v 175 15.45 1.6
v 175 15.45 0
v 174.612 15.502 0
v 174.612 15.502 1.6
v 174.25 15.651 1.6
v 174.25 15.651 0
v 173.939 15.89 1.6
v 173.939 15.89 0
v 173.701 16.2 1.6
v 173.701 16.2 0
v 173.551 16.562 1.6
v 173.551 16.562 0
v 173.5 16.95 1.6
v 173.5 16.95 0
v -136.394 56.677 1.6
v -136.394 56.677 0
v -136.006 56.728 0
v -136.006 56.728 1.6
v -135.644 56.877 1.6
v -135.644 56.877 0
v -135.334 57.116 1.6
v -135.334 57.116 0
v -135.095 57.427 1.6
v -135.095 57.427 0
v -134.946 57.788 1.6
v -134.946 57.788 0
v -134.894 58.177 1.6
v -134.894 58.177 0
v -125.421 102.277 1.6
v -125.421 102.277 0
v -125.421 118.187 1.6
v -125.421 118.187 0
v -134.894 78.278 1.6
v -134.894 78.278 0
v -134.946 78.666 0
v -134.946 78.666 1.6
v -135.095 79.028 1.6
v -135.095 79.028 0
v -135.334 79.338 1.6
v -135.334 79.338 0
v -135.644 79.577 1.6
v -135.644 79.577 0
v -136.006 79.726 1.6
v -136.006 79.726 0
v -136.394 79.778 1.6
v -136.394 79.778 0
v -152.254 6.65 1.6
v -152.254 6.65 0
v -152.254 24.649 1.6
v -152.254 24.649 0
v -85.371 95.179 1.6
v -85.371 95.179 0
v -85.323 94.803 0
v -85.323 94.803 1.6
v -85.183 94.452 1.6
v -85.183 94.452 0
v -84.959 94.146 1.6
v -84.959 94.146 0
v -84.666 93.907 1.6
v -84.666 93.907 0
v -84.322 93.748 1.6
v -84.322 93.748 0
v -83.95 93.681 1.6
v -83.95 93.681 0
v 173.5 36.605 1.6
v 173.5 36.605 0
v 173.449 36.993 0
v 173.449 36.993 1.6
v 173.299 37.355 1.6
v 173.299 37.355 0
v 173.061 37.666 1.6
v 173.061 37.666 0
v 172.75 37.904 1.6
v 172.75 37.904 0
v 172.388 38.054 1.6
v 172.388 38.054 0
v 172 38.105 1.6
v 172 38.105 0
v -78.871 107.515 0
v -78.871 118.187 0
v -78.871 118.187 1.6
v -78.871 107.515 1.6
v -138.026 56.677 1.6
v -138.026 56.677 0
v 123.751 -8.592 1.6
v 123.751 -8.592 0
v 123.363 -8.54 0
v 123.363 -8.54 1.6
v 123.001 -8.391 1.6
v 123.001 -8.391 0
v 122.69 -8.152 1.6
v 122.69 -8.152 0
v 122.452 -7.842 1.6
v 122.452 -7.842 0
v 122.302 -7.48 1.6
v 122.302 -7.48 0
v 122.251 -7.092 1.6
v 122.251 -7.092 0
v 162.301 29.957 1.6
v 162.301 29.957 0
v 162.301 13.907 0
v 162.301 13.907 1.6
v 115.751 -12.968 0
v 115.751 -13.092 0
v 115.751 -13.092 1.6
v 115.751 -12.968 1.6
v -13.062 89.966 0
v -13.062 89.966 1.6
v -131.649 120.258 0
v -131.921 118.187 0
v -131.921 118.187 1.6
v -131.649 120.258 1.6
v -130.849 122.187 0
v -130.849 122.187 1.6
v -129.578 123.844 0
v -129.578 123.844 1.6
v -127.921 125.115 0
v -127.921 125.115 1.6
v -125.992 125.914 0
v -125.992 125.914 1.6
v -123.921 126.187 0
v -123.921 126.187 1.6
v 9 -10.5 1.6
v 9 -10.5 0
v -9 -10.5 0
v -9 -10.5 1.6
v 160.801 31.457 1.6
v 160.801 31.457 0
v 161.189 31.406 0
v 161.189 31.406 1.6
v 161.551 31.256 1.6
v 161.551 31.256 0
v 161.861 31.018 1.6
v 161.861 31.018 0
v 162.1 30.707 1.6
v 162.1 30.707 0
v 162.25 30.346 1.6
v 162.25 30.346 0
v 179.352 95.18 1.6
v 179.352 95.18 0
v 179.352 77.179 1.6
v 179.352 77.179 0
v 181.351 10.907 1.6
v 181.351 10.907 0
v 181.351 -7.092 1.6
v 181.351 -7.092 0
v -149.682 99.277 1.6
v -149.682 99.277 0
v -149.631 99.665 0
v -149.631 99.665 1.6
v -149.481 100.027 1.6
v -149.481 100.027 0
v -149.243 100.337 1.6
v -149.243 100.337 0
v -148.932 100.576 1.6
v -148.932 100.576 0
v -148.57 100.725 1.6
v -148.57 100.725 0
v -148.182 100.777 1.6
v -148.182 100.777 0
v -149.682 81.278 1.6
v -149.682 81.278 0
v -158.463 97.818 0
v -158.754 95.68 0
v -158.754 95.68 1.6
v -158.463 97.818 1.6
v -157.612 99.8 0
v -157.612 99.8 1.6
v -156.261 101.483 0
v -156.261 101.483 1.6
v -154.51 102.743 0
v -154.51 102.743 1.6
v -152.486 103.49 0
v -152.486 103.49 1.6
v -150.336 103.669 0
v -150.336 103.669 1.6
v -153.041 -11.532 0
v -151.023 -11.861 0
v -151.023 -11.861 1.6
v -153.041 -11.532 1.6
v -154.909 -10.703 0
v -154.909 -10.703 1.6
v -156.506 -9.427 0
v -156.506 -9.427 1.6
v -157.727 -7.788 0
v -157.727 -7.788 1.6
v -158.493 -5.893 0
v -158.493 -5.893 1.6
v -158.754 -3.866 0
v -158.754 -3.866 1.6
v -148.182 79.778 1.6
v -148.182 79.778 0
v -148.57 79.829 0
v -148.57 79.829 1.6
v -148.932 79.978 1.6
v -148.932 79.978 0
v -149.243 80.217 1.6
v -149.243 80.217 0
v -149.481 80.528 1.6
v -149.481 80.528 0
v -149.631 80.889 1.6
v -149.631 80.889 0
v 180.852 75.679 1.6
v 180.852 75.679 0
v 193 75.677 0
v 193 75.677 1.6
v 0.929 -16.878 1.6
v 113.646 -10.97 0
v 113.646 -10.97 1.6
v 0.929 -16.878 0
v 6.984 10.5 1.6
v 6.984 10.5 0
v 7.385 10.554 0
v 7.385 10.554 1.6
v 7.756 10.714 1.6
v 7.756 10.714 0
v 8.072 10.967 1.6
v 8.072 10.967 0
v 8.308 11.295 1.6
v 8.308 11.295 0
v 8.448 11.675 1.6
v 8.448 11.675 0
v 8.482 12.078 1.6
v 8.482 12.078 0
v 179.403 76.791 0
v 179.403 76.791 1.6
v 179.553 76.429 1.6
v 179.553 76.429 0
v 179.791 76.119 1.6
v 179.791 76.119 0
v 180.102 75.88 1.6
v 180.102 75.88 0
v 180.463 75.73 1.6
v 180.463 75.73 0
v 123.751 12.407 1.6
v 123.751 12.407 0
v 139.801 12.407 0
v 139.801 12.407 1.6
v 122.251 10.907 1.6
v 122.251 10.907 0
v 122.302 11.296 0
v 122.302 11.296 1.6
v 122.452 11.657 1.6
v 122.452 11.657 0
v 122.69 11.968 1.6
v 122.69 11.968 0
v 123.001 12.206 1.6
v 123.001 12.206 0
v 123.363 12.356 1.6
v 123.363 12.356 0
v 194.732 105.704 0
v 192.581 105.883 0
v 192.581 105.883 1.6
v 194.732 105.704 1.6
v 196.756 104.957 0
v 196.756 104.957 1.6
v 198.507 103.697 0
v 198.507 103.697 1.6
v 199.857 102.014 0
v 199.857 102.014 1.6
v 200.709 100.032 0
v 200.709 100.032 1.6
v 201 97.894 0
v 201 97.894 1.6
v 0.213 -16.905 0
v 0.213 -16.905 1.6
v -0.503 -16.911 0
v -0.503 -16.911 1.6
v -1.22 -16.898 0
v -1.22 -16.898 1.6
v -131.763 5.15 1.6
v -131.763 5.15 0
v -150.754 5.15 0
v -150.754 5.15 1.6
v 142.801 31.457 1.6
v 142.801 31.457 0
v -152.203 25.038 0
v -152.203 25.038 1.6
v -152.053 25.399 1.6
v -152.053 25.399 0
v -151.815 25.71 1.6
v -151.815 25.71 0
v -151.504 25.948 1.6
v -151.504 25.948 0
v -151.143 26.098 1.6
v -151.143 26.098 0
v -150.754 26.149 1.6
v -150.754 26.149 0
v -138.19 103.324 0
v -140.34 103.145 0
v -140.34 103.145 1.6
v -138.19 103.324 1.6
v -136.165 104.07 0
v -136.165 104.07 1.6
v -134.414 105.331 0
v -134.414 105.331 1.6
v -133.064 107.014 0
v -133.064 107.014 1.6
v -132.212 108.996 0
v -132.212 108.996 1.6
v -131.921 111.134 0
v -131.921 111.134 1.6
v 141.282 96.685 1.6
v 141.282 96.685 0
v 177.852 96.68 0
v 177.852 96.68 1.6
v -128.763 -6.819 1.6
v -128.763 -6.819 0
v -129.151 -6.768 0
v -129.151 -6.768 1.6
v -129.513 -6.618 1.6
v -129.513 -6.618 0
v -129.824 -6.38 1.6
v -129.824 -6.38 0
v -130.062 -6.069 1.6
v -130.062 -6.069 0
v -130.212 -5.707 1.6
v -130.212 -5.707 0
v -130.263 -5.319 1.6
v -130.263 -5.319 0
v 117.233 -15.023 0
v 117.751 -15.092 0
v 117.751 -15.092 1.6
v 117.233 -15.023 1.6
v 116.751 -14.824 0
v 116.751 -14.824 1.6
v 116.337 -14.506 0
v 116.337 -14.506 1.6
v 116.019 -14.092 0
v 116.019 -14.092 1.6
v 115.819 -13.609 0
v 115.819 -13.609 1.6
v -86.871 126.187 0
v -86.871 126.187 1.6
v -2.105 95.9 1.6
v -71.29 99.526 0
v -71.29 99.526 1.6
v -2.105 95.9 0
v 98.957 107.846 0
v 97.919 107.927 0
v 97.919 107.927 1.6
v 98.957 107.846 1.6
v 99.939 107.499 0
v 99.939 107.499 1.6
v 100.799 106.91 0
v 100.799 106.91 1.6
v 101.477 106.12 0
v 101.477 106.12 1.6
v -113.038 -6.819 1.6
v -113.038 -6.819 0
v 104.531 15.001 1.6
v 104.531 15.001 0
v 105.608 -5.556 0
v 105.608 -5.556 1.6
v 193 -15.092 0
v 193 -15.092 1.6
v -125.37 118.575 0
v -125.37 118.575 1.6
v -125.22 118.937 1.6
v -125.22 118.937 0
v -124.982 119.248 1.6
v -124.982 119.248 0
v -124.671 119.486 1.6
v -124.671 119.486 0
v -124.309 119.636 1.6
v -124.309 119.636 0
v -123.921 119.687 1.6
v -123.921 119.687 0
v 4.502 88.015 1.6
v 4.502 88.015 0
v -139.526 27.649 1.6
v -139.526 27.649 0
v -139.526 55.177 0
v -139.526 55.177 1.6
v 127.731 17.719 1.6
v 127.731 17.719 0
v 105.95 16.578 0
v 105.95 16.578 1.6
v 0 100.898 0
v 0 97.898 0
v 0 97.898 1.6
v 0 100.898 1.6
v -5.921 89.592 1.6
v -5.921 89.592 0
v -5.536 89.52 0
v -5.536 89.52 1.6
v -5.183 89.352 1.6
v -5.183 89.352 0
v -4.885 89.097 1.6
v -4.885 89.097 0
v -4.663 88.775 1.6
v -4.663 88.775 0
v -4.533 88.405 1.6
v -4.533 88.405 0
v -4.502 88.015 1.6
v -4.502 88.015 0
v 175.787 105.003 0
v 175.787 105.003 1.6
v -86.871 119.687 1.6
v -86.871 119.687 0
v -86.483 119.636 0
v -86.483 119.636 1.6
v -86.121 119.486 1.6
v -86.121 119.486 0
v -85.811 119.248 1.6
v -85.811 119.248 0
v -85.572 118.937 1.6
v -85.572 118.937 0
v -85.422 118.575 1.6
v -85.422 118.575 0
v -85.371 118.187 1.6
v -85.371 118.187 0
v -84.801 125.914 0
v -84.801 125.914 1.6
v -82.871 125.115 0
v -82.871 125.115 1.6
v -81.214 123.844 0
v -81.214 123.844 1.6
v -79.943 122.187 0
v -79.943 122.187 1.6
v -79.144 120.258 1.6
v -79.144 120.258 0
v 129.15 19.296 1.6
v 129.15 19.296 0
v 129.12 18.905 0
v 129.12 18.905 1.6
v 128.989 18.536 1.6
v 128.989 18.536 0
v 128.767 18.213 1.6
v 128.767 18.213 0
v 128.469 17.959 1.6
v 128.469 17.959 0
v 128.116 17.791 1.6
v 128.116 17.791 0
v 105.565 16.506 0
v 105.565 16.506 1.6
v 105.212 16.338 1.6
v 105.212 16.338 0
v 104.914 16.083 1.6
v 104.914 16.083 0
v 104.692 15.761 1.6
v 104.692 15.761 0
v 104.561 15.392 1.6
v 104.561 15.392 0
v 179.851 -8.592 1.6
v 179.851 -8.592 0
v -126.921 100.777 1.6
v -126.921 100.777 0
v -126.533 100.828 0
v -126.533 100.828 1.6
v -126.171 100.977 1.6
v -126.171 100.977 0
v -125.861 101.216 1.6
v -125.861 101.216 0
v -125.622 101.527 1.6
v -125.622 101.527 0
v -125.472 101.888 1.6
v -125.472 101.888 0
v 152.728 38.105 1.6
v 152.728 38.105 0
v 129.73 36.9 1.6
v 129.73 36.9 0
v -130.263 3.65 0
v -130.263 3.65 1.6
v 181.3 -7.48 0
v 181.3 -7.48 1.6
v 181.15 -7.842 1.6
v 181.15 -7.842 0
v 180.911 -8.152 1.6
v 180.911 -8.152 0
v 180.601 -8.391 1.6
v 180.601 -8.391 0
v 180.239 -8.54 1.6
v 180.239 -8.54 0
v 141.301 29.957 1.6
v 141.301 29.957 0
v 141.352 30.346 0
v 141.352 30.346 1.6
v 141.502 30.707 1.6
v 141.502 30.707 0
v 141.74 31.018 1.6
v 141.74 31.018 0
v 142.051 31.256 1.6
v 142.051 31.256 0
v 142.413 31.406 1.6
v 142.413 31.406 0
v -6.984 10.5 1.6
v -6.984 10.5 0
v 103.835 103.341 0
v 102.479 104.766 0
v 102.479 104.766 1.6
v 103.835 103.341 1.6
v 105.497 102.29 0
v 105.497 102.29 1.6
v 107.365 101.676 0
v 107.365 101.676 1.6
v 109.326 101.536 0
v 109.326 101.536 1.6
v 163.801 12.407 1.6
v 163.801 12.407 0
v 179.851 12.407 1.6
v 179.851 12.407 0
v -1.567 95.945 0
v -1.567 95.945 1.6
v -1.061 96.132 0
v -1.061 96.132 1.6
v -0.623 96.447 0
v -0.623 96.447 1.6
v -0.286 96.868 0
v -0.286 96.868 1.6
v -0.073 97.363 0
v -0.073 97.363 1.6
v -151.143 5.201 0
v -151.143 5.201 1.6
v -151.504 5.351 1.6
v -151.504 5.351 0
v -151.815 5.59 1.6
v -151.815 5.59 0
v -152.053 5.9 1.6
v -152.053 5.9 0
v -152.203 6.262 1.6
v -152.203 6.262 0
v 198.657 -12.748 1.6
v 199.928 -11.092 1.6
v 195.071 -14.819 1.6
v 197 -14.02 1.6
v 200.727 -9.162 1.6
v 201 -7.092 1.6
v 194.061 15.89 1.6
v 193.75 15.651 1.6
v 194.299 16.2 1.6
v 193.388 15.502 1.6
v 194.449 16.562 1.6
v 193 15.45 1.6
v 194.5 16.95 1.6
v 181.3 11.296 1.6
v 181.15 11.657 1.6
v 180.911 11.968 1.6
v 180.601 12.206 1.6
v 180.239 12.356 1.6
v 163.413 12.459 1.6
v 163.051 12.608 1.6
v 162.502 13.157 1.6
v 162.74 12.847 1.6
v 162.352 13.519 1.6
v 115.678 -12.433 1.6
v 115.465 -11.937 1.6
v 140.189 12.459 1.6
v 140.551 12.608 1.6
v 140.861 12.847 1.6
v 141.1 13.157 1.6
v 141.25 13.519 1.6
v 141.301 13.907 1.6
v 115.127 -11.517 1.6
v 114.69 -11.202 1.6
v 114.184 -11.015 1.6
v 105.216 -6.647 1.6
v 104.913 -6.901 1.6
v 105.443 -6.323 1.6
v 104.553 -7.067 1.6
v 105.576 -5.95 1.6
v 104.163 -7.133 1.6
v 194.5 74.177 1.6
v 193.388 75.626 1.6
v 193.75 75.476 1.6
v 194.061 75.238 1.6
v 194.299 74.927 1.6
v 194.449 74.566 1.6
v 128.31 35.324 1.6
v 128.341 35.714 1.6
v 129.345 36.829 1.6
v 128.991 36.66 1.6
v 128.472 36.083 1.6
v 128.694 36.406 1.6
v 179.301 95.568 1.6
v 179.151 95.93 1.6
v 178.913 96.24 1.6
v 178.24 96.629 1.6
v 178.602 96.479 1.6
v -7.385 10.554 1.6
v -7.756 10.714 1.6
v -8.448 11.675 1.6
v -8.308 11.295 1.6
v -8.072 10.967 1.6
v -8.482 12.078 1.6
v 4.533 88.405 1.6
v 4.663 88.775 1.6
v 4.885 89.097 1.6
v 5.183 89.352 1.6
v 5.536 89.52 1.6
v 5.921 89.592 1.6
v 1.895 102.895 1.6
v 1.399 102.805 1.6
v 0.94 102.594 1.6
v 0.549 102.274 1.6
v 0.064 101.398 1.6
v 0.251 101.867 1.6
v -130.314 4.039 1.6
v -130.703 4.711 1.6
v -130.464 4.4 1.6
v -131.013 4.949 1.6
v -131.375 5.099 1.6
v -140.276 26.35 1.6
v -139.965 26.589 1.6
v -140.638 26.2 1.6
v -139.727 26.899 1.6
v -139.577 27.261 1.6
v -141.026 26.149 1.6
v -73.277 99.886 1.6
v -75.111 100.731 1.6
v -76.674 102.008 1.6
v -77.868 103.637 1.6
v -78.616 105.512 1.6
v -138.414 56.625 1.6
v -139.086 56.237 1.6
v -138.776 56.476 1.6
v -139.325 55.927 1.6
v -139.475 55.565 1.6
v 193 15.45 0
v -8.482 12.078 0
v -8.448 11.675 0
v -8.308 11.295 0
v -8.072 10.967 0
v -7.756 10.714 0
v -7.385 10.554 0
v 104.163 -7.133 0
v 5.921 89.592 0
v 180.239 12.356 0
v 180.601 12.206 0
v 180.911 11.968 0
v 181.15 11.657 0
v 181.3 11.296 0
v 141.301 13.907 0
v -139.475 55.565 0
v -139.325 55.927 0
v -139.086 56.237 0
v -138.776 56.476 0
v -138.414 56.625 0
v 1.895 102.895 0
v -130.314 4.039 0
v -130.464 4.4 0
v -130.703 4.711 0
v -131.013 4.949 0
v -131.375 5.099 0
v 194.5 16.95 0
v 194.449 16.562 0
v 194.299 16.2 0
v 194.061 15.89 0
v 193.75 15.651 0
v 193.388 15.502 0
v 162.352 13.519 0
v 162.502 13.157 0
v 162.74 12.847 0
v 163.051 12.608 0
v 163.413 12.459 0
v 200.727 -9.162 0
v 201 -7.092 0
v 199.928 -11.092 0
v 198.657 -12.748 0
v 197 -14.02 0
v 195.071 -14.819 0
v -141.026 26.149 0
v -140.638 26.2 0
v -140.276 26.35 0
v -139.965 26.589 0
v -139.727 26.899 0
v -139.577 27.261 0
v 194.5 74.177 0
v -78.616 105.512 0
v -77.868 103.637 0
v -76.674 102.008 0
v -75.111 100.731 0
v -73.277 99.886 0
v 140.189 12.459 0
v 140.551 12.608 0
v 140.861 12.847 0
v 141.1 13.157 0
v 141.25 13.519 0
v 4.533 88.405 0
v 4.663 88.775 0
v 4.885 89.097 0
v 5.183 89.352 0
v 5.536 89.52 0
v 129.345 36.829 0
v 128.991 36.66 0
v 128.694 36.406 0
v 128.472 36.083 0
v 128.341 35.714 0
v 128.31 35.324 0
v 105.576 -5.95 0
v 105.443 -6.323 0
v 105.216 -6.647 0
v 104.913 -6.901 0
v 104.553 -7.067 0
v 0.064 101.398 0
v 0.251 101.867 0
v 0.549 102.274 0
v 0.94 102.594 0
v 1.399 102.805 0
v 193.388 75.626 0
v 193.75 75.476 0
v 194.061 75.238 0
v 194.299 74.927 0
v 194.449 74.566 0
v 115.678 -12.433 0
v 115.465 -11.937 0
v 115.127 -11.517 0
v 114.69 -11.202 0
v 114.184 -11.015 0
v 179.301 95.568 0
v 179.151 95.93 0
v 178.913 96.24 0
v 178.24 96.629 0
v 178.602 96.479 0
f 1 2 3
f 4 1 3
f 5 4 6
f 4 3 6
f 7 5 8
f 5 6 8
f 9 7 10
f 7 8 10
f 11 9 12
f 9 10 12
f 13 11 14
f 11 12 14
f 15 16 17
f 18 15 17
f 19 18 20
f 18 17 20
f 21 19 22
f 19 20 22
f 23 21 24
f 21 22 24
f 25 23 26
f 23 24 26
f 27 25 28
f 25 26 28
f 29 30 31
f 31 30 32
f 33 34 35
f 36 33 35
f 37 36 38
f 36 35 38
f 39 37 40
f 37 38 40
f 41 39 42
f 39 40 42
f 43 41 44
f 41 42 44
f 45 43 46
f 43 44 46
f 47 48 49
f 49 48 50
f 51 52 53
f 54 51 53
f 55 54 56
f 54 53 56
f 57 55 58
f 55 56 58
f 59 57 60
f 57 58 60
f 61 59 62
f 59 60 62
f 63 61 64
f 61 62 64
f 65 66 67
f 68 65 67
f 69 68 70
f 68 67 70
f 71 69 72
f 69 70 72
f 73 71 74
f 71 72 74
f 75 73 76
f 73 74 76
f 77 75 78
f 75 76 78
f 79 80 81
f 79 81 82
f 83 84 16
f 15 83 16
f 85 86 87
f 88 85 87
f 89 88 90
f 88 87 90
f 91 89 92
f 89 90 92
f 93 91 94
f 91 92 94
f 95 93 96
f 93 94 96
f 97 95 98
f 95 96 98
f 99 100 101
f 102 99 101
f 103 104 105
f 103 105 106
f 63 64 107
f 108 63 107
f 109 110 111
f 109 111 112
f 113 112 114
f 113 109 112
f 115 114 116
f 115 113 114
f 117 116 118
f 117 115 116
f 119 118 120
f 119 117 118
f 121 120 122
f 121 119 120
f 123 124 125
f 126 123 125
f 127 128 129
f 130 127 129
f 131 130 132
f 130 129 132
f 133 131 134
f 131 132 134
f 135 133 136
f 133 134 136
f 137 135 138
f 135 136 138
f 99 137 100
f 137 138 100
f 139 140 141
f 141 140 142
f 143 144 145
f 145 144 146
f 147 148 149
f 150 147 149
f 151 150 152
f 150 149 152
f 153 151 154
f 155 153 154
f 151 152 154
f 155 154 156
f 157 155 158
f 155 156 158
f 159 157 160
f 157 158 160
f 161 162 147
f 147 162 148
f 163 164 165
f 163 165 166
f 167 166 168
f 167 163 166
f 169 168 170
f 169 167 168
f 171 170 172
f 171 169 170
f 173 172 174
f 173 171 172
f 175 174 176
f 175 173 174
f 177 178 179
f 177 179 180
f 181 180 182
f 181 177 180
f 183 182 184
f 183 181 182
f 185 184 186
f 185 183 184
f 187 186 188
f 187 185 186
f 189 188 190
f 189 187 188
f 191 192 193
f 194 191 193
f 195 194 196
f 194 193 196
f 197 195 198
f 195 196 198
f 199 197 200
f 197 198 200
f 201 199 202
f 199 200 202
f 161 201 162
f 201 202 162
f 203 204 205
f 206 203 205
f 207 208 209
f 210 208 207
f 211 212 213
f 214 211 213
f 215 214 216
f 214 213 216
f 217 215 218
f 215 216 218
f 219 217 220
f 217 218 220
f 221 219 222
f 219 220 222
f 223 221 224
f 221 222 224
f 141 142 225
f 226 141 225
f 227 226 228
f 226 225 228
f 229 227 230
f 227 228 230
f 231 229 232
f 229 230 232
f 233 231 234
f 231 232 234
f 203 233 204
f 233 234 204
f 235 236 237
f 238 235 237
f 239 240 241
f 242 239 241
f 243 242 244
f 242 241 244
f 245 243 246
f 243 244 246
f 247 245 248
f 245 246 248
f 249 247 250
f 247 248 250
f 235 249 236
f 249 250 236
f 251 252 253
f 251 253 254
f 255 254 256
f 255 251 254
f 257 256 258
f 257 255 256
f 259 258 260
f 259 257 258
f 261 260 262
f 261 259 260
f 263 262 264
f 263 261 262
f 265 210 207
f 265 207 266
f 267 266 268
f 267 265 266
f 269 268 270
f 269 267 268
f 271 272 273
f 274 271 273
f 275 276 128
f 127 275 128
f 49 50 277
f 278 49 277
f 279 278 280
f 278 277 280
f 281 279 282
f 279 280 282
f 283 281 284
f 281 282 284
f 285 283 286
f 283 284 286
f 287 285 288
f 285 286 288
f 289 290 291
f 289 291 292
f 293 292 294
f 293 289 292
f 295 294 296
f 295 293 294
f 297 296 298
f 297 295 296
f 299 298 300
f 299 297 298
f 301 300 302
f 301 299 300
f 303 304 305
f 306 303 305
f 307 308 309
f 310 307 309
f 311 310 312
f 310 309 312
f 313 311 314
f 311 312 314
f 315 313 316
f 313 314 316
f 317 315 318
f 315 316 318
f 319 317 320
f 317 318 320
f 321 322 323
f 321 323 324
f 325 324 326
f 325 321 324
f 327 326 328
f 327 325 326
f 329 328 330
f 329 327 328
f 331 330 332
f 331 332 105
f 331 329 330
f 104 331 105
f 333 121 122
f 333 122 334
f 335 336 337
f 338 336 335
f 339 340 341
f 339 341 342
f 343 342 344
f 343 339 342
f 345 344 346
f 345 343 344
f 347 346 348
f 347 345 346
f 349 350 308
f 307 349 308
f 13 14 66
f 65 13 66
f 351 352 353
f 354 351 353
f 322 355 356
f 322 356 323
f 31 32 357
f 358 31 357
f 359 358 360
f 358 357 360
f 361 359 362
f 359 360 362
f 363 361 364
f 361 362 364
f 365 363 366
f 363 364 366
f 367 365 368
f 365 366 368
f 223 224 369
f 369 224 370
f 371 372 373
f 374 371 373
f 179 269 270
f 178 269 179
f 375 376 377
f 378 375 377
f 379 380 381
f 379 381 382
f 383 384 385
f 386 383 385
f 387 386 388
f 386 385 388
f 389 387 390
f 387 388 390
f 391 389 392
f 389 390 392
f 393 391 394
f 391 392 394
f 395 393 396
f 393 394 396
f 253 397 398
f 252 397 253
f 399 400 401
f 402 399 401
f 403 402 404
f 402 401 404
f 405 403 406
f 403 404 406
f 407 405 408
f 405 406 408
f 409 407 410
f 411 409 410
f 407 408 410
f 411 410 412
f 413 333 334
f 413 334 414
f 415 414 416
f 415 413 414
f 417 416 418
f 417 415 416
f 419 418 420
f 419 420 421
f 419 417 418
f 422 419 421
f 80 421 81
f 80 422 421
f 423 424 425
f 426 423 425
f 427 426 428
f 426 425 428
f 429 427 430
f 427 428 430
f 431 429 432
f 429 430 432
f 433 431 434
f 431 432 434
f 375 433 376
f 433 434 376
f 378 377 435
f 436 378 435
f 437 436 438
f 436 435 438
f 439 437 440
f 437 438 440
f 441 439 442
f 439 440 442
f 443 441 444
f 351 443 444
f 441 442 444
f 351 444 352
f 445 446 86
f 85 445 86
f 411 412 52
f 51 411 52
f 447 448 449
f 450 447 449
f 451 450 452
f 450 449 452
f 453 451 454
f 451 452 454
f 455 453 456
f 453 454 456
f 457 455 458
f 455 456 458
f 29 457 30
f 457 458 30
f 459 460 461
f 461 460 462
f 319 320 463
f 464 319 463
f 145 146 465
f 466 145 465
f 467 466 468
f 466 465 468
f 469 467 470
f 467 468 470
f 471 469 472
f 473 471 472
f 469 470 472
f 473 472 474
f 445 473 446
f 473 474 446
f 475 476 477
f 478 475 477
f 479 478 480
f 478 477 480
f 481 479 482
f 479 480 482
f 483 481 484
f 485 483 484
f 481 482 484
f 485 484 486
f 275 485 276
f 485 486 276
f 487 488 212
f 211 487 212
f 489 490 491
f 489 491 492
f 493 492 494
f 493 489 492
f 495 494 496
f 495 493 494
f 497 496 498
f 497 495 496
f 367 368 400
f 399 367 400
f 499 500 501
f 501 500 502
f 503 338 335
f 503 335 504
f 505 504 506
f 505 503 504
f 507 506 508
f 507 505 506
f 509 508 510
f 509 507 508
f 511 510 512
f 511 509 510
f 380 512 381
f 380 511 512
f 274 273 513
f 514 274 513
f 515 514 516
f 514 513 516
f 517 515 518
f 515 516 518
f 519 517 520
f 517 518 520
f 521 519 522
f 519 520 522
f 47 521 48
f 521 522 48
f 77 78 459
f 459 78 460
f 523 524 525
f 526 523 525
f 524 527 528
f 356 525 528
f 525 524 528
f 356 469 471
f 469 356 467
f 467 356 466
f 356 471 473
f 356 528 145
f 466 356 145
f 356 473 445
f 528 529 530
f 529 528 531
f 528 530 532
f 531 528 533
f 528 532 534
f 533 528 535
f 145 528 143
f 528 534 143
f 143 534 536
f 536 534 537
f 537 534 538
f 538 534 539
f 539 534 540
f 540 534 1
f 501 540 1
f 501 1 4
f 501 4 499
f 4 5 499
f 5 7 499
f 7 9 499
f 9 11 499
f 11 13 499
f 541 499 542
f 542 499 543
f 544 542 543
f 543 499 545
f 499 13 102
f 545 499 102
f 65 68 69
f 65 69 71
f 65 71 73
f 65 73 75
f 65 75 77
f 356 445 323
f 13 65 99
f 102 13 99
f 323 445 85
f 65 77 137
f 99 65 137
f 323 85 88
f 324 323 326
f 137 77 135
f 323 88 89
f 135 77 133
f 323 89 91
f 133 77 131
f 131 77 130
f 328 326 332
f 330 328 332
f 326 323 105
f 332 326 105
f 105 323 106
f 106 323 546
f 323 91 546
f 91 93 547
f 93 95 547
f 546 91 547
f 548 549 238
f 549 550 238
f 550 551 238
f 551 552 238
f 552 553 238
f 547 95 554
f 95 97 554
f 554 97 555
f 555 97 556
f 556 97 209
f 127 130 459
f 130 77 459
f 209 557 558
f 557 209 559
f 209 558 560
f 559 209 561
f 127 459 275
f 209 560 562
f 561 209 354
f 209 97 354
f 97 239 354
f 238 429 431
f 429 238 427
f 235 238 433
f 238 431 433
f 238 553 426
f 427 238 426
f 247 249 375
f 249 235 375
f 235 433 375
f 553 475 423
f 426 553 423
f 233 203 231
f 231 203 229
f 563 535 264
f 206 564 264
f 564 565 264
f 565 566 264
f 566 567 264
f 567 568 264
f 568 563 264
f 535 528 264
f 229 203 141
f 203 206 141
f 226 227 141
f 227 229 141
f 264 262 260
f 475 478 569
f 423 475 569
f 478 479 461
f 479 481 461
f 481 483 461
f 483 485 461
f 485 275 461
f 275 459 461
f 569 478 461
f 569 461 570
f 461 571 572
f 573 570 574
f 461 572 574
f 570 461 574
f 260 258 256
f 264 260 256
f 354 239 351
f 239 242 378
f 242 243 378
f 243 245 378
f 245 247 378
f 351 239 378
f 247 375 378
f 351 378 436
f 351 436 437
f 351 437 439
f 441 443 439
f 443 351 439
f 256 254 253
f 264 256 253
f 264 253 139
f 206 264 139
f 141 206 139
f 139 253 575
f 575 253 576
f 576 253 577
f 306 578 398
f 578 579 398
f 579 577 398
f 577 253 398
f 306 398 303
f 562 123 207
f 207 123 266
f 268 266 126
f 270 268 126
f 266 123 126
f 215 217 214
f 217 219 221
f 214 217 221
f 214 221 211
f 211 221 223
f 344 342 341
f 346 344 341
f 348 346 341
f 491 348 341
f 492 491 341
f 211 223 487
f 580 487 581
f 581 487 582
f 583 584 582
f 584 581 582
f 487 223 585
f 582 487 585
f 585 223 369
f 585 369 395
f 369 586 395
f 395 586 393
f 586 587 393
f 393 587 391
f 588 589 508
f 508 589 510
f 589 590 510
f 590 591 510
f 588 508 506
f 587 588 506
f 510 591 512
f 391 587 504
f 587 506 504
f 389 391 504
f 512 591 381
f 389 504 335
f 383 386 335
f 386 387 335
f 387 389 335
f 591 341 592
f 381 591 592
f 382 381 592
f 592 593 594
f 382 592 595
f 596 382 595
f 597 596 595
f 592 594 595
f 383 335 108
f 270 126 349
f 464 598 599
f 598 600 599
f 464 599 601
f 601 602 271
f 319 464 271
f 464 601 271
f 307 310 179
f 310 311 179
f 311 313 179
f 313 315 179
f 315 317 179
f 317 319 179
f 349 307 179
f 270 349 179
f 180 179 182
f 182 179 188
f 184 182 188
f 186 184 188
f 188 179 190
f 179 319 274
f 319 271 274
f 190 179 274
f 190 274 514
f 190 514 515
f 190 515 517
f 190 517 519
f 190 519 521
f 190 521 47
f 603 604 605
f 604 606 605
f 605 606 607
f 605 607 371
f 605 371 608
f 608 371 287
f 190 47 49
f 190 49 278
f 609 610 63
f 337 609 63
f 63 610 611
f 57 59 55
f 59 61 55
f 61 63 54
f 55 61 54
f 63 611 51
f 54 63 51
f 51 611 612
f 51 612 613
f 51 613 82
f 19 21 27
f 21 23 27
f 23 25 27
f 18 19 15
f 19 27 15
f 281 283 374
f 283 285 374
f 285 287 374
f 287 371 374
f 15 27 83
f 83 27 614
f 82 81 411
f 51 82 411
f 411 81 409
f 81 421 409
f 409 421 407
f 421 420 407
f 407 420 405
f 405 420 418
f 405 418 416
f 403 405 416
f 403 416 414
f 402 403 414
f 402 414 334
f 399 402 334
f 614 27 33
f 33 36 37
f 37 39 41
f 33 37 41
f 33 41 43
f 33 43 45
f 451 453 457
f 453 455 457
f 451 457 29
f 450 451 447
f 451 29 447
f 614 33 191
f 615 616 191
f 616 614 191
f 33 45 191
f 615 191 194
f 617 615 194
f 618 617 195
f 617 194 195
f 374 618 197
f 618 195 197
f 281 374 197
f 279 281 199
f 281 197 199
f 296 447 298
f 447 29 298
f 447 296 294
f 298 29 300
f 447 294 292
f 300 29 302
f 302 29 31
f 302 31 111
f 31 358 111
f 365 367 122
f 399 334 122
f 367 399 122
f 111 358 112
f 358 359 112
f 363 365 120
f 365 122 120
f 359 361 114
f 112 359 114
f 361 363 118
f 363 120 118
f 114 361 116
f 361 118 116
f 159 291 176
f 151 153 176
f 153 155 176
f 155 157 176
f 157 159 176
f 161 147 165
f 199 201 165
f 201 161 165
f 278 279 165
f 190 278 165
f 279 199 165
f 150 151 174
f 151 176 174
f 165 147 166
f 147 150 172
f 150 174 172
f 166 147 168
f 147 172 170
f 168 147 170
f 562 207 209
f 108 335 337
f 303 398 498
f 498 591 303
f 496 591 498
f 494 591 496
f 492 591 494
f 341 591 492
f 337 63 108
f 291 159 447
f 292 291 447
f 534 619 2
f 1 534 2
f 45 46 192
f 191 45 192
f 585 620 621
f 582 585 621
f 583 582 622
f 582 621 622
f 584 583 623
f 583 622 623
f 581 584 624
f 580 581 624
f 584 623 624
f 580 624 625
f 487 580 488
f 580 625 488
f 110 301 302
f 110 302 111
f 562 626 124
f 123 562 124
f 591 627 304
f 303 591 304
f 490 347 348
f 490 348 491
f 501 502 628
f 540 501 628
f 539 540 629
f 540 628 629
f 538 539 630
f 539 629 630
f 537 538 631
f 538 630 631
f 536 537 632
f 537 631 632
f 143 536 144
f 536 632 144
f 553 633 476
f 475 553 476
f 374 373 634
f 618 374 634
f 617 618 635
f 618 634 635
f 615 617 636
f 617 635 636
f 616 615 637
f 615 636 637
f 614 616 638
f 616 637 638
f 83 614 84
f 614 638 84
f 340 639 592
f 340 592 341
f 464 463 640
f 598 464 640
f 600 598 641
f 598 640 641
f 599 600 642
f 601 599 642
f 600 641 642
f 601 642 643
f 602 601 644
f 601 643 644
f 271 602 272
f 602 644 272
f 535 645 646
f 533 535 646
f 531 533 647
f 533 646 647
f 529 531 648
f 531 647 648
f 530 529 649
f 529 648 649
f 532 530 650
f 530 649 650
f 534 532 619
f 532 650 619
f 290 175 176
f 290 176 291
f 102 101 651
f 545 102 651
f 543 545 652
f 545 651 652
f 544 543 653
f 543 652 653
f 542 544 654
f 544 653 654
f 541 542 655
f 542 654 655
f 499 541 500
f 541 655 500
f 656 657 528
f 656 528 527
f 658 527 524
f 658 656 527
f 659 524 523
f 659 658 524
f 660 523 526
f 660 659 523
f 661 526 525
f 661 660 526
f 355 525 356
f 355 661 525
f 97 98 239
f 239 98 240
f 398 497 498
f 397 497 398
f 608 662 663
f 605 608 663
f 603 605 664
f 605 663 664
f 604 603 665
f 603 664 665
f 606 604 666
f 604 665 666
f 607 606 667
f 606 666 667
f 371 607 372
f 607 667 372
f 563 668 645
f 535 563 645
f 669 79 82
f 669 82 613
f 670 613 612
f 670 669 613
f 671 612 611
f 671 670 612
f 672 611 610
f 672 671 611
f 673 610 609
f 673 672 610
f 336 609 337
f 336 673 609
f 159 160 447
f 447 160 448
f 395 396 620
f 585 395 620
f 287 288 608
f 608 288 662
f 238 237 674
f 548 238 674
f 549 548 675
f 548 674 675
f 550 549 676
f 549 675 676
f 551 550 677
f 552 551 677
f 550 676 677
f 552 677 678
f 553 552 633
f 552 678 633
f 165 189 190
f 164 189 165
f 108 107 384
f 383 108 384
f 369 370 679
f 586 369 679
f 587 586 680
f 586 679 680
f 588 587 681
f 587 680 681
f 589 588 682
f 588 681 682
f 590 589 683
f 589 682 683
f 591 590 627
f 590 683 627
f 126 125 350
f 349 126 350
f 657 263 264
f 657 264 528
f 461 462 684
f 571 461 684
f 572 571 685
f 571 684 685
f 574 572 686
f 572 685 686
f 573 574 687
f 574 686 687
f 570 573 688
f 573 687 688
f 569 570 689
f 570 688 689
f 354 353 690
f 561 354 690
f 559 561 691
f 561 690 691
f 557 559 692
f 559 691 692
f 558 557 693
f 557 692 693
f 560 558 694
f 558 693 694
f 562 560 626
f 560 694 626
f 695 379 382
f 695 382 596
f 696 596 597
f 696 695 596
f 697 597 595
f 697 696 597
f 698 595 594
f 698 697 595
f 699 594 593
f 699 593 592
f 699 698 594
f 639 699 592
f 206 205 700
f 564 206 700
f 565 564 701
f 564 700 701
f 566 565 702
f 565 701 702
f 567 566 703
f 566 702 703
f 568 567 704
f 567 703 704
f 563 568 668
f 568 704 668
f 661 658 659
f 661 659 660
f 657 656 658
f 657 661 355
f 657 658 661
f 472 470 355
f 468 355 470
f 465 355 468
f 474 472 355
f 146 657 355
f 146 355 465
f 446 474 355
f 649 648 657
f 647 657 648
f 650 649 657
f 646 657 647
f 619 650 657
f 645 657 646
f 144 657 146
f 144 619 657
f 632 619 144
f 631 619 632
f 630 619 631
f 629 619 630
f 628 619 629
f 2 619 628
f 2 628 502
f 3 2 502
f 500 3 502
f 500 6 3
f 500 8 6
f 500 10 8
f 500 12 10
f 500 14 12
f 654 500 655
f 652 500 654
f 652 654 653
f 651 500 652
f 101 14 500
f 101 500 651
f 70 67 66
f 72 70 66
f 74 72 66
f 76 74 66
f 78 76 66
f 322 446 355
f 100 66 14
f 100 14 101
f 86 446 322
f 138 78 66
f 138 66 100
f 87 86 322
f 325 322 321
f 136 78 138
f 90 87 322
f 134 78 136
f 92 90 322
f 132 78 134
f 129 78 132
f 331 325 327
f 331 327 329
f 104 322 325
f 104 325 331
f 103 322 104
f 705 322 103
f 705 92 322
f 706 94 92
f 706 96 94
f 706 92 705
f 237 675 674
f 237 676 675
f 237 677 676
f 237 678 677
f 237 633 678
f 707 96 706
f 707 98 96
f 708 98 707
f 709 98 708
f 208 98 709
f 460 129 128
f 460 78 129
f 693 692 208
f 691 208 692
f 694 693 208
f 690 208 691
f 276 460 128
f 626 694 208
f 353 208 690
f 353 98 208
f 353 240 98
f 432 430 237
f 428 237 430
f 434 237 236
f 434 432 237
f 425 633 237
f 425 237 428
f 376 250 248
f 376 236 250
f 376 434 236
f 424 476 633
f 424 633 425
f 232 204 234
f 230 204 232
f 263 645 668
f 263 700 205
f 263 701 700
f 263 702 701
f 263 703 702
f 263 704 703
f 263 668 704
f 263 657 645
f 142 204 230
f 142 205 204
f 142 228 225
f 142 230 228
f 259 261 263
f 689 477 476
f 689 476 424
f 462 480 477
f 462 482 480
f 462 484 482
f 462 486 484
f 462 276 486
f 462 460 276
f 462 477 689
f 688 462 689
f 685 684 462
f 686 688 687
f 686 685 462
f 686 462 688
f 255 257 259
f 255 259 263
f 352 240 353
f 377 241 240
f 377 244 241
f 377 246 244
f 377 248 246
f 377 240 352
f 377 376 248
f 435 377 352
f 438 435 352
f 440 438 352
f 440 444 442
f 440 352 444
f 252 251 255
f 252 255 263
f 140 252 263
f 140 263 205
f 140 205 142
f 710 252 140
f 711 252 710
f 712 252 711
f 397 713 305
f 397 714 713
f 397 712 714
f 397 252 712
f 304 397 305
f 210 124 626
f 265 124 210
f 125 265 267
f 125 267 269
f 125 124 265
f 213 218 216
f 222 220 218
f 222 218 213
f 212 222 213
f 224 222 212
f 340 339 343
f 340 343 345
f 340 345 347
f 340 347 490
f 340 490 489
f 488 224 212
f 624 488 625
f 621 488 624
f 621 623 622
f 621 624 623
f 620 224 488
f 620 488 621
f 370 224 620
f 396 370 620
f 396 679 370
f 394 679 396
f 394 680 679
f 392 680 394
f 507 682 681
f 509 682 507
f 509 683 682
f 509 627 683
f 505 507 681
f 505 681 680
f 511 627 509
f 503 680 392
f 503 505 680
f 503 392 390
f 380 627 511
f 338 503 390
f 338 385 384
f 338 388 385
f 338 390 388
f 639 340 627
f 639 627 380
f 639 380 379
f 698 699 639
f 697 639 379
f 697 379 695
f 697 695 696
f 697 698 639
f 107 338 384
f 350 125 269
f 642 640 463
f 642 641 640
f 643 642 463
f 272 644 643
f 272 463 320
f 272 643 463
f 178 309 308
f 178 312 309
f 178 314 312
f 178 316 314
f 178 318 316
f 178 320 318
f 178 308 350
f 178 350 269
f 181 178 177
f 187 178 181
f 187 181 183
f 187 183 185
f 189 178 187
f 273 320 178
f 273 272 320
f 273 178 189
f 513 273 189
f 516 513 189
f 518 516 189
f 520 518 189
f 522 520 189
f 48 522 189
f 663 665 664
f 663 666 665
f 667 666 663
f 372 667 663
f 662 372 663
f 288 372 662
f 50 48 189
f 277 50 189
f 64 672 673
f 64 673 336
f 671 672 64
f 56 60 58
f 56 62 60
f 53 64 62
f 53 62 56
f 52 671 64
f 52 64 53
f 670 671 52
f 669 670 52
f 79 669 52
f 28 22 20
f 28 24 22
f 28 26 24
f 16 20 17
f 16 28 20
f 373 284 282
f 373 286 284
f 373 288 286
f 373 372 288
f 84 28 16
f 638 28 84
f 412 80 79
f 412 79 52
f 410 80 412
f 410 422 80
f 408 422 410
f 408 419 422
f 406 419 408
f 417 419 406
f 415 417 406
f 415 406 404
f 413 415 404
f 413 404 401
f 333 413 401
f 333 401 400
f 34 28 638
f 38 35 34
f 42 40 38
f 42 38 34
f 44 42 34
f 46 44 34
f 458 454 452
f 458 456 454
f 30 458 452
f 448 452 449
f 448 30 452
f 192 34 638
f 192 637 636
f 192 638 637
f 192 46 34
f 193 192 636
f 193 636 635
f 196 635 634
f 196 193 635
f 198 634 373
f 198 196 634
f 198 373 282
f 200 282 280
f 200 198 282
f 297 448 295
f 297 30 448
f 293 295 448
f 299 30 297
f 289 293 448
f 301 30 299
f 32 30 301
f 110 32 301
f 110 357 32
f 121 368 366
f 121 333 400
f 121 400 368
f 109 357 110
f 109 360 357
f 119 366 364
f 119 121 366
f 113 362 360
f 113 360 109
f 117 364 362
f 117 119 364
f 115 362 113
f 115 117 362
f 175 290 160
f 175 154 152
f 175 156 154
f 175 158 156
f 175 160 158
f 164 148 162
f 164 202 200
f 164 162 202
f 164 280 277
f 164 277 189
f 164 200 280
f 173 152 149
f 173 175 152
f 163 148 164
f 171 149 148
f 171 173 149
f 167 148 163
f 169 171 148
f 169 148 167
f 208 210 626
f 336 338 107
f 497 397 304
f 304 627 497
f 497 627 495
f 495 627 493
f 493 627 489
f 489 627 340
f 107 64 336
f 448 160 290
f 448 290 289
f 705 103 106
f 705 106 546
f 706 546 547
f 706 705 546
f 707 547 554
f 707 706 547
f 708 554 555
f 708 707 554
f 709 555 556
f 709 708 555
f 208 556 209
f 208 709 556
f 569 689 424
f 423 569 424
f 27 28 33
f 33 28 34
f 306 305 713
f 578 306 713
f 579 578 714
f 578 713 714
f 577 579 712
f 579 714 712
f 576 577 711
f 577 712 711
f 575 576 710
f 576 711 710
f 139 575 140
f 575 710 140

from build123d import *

# Parameters (mm, degrees)
ESTRUSIONE_ESTRUSIONE1_DEPTH = 1.6


with BuildPart() as part:
    # bordo3 → Estrusione-Estrusione1 (new body)
    with BuildSketch(Plane.XY):
        with BuildLine():
            Line((192.58131235, 105.882892913), (175.787012069, 105.00274093))
            Line((175.787012069, 105.00274093), (109.326285673, 101.536231916))
            ThreePointArc((109.326285673, 101.536231916), (105.496696561, 102.289889033), (102.479467612, 104.76578913))
            Line((102.479467612, 104.76578913), (101.477166344, 106.11988089))
            ThreePointArc((101.477166344, 106.11988089), (99.939463207, 107.499136975), (97.91868765, 107.927324355))
            Line((97.91868765, 107.927324355), (1.895328088, 102.894953321))
            ThreePointArc((1.895328088, 102.894953321), (0.549251258, 102.274403403), (0, 100.897694252))
            Line((0, 100.897694252), (0, 97.897694252))
            ThreePointArc((0, 97.897694252), (-0.623290849, 96.44694551), (-2.104671912, 95.900435182))
            Line((-2.104671912, 95.900435182), (-71.289889089, 99.526278774))
            ThreePointArc((-71.289889089, 99.526278774), (-76.674196407, 102.008478446), (-78.871201439, 107.515315052))
            Line((-78.871201439, 107.515315052), (-78.871201439, 118.187089821))
            ThreePointArc((-78.871201439, 118.187089821), (-81.214347189, 123.843944071), (-86.871201439, 126.187089821))
            Line((-86.871201439, 126.187089821), (-123.921201439, 126.187089821))
            ThreePointArc((-123.921201439, 126.187089821), (-129.578055688, 123.843944071), (-131.921201439, 118.187089821))
            Line((-131.921201439, 118.187089821), (-131.921201439, 111.134072211))
            ThreePointArc((-131.921201439, 111.134072211), (-134.414364833, 105.331077243), (-140.339889089, 103.145035933))
            Line((-140.339889089, 103.145035933), (-150.335746034, 103.668896598))
            ThreePointArc((-150.335746034, 103.668896598), (-156.26127029, 101.482855288), (-158.754433684, 95.67986032))
            Line((-158.754433684, 95.67986032), (-158.754433684, -3.865947122))
            ThreePointArc((-158.754433684, -3.865947122), (-156.505538032, -9.426954116), (-151.023233988, -11.861429997))
            Line((-151.023233988, -11.861429997), (-139.525733684, -12.247964697))
            Line((-139.525733684, -12.247964697), (-1.219558299, -16.897682863))
            ThreePointArc((-1.219558299, -16.897682863), (-0.145141858, -16.910699844), (0.928841556, -16.877537249))
            Line((0.928841556, -16.877537249), (113.64611863, -10.970275071))
            ThreePointArc((113.64611863, -10.970275071), (115.127499694, -11.516785399), (115.750790543, -12.967534141))
            Line((115.750790543, -12.967534141), (115.750790543, -13.091597346))
            ThreePointArc((115.750790543, -13.091597346), (116.336576981, -14.505810909), (117.750790543, -15.091597346))
            Line((117.750790543, -15.091597346), (193, -15.091597346))
            ThreePointArc((193, -15.091597346), (198.656854249, -12.748451596), (201, -7.091597346))
            Line((201, -7.091597346), (201, 97.893856635))
            ThreePointArc((201, 97.893856635), (198.506836606, 103.696851603), (192.58131235, 105.882892913))
        make_face()
        with BuildLine():
            ThreePointArc((4.502055698, 88.015097974), (4.885282762, 89.097297818), (5.921496066, 89.591546211))
            Line((5.921496066, 89.591546211), (141.282050751, 96.685492285))
            Line((141.282050751, 96.685492285), (177.852024899, 96.679778694))
            ThreePointArc((177.852024899, 96.679778694), (178.912533569, 96.240356024), (179.351790543, 95.179778713))
            Line((179.351790543, 95.179778713), (179.351790543, 77.179309781))
            ThreePointArc((179.351790543, 77.179309781), (179.791047517, 76.11873247), (180.851556187, 75.6793098))
            Line((180.851556187, 75.6793098), (193.000234356, 75.677411724))
            ThreePointArc((193.000234356, 75.677411724), (194.060743026, 75.237989054), (194.5, 74.177411743))
            Line((194.5, 74.177411743), (194.5, 16.9505))
            ThreePointArc((194.5, 16.9505), (194.060660172, 15.889839828), (193, 15.4505))
            Line((193, 15.4505), (175, 15.4505))
            ThreePointArc((175, 15.4505), (173.939339828, 15.889839828), (173.5, 16.9505))
            Line((173.5, 16.9505), (173.5, 36.605240872))
            ThreePointArc((173.5, 36.605240872), (173.060660172, 37.665901044), (172, 38.105240872))
            Line((172, 38.105240872), (152.727925239, 38.105240872))
            Line((152.727925239, 38.105240872), (129.729835534, 36.899962063))
            ThreePointArc((129.729835534, 36.899962063), (128.69362223, 36.405713671), (128.310395167, 35.323513827))
            Line((128.310395167, 35.323513827), (129.150382031, 19.295609657))
            ThreePointArc((129.150382031, 19.295609657), (128.767154967, 18.213409813), (127.730941663, 17.71916142))
            Line((127.730941663, 17.71916142), (105.950202838, 16.577681267))
            ThreePointArc((105.950202838, 16.577681267), (104.913989534, 16.083432875), (104.53076247, 15.001233031))
            Line((104.53076247, 15.001233031), (105.60810129, -5.555616249))
            ThreePointArc((105.60810129, -5.555616249), (105.216302409, -6.647255074), (104.163185056, -7.133182565))
            Line((104.163185056, -7.133182565), (9, -10.4995))
            Line((9, -10.4995), (-9, -10.4995))
            Line((-9, -10.4995), (-113.037709318, -6.819253752))
            Line((-113.037709318, -6.819253752), (-128.763233684, -6.819253752))
            ThreePointArc((-128.763233684, -6.819253752), (-129.823893856, -6.379913923), (-130.263233684, -5.319253752))
            Line((-130.263233684, -5.319253752), (-130.263233684, 3.650335982))
            ThreePointArc((-130.263233684, 3.650335982), (-130.702573513, 4.710996153), (-131.763233684, 5.150335982))
            Line((-131.763233684, 5.150335982), (-150.754433684, 5.150335982))
            ThreePointArc((-150.754433684, 5.150335982), (-151.815093856, 5.58967581), (-152.254433684, 6.650335982))
            Line((-152.254433684, 6.650335982), (-152.254433684, 24.649335982))
            ThreePointArc((-152.254433684, 24.649335982), (-151.815093856, 25.709996153), (-150.754433684, 26.149335982))
            Line((-150.754433684, 26.149335982), (-141.025733684, 26.149335982))
            ThreePointArc((-141.025733684, 26.149335982), (-139.965073513, 26.58867581), (-139.525733684, 27.649335982))
            Line((-139.525733684, 27.649335982), (-139.525733684, 55.176535982))
            ThreePointArc((-139.525733684, 55.176535982), (-139.086393856, 56.237196153), (-138.025733684, 56.676535982))
            Line((-138.025733684, 56.676535982), (-136.394433684, 56.676535982))
            ThreePointArc((-136.394433684, 56.676535982), (-135.333773513, 57.11587581), (-134.894433684, 58.176535982))
            Line((-134.894433684, 58.176535982), (-134.894433684, 78.277535982))
            ThreePointArc((-134.894433684, 78.277535982), (-135.333773513, 79.338196153), (-136.394433684, 79.777535982))
            Line((-136.394433684, 79.777535982), (-148.181933684, 79.777535982))
            ThreePointArc((-148.181933684, 79.777535982), (-149.242593856, 80.21687581), (-149.681933684, 81.277535982))
            Line((-149.681933684, 81.277535982), (-149.681933684, 99.276535982))
            ThreePointArc((-149.681933684, 99.276535982), (-149.242593856, 100.337196153), (-148.181933684, 100.776535982))
            Line((-148.181933684, 100.776535982), (-126.921201439, 100.776535982))
            ThreePointArc((-126.921201439, 100.776535982), (-125.860541267, 101.21587581), (-125.421201439, 102.276535982))
            Line((-125.421201439, 102.276535982), (-125.421201439, 118.187089821))
            ThreePointArc((-125.421201439, 118.187089821), (-124.981861611, 119.247749993), (-123.921201439, 119.687089821))
            Line((-123.921201439, 119.687089821), (-86.871201439, 119.687089821))
            ThreePointArc((-86.871201439, 119.687089821), (-85.810541267, 119.247749993), (-85.371201439, 118.187089821))
            Line((-85.371201439, 118.187089821), (-85.371201439, 95.178775684))
            ThreePointArc((-85.371201439, 95.178775684), (-84.959262995, 94.146243821), (-83.949705373, 93.680831382))
            Line((-83.949705373, 93.680831382), (-13.061697239, 89.965748298))
            Line((-13.061697239, 89.965748298), (-5.921496066, 89.591546211))
            ThreePointArc((-5.921496066, 89.591546211), (-4.885282762, 89.097297818), (-4.502055698, 88.015097975))
            Line((-4.502055698, 88.015097975), (-8.481750162, 12.078003934))
            ThreePointArc((-8.481750162, 12.078003934), (-8.071867416, 10.966968136), (-6.98380586, 10.4995))
            Line((-6.98380586, 10.4995), (6.98380586, 10.4995))
            ThreePointArc((6.98380586, 10.4995), (8.071867416, 10.966968136), (8.481750162, 12.078003934))
            Line((8.481750162, 12.078003934), (4.502055698, 88.015097974))
        make_face(mode=Mode.SUBTRACT)
        with BuildLine():
            ThreePointArc((123.750790543, -8.591597346), (122.690130371, -8.152257518), (122.250790543, -7.091597346))
            Line((122.250790543, -7.091597346), (122.250790543, 10.907402654))
            ThreePointArc((122.250790543, 10.907402654), (122.690130371, 11.968062825), (123.750790543, 12.407402654))
            Line((123.750790543, 12.407402654), (139.800790543, 12.407402654))
            ThreePointArc((139.800790543, 12.407402654), (140.861450715, 12.846742482), (141.300790543, 13.907402654))
            Line((141.300790543, 13.907402654), (141.300790543, 29.957402654))
            ThreePointArc((141.300790543, 29.957402654), (141.740130371, 31.018062825), (142.800790543, 31.457402654))
            Line((142.800790543, 31.457402654), (160.800790543, 31.457402654))
            ThreePointArc((160.800790543, 31.457402654), (161.861450715, 31.018062825), (162.300790543, 29.957402654))
            Line((162.300790543, 29.957402654), (162.300790543, 13.907402654))
            ThreePointArc((162.300790543, 13.907402654), (162.740130371, 12.846742482), (163.800790543, 12.407402654))
            Line((163.800790543, 12.407402654), (179.850790543, 12.407402654))
            ThreePointArc((179.850790543, 12.407402654), (180.911450715, 11.968062825), (181.350790543, 10.907402654))
            Line((181.350790543, 10.907402654), (181.350790543, -7.091597346))
            ThreePointArc((181.350790543, -7.091597346), (180.911450715, -8.152257518), (179.850790543, -8.591597346))
            Line((179.850790543, -8.591597346), (123.750790543, -8.591597346))
        make_face(mode=Mode.SUBTRACT)
    extrude(amount=ESTRUSIONE_ESTRUSIONE1_DEPTH)


solid = part.part
